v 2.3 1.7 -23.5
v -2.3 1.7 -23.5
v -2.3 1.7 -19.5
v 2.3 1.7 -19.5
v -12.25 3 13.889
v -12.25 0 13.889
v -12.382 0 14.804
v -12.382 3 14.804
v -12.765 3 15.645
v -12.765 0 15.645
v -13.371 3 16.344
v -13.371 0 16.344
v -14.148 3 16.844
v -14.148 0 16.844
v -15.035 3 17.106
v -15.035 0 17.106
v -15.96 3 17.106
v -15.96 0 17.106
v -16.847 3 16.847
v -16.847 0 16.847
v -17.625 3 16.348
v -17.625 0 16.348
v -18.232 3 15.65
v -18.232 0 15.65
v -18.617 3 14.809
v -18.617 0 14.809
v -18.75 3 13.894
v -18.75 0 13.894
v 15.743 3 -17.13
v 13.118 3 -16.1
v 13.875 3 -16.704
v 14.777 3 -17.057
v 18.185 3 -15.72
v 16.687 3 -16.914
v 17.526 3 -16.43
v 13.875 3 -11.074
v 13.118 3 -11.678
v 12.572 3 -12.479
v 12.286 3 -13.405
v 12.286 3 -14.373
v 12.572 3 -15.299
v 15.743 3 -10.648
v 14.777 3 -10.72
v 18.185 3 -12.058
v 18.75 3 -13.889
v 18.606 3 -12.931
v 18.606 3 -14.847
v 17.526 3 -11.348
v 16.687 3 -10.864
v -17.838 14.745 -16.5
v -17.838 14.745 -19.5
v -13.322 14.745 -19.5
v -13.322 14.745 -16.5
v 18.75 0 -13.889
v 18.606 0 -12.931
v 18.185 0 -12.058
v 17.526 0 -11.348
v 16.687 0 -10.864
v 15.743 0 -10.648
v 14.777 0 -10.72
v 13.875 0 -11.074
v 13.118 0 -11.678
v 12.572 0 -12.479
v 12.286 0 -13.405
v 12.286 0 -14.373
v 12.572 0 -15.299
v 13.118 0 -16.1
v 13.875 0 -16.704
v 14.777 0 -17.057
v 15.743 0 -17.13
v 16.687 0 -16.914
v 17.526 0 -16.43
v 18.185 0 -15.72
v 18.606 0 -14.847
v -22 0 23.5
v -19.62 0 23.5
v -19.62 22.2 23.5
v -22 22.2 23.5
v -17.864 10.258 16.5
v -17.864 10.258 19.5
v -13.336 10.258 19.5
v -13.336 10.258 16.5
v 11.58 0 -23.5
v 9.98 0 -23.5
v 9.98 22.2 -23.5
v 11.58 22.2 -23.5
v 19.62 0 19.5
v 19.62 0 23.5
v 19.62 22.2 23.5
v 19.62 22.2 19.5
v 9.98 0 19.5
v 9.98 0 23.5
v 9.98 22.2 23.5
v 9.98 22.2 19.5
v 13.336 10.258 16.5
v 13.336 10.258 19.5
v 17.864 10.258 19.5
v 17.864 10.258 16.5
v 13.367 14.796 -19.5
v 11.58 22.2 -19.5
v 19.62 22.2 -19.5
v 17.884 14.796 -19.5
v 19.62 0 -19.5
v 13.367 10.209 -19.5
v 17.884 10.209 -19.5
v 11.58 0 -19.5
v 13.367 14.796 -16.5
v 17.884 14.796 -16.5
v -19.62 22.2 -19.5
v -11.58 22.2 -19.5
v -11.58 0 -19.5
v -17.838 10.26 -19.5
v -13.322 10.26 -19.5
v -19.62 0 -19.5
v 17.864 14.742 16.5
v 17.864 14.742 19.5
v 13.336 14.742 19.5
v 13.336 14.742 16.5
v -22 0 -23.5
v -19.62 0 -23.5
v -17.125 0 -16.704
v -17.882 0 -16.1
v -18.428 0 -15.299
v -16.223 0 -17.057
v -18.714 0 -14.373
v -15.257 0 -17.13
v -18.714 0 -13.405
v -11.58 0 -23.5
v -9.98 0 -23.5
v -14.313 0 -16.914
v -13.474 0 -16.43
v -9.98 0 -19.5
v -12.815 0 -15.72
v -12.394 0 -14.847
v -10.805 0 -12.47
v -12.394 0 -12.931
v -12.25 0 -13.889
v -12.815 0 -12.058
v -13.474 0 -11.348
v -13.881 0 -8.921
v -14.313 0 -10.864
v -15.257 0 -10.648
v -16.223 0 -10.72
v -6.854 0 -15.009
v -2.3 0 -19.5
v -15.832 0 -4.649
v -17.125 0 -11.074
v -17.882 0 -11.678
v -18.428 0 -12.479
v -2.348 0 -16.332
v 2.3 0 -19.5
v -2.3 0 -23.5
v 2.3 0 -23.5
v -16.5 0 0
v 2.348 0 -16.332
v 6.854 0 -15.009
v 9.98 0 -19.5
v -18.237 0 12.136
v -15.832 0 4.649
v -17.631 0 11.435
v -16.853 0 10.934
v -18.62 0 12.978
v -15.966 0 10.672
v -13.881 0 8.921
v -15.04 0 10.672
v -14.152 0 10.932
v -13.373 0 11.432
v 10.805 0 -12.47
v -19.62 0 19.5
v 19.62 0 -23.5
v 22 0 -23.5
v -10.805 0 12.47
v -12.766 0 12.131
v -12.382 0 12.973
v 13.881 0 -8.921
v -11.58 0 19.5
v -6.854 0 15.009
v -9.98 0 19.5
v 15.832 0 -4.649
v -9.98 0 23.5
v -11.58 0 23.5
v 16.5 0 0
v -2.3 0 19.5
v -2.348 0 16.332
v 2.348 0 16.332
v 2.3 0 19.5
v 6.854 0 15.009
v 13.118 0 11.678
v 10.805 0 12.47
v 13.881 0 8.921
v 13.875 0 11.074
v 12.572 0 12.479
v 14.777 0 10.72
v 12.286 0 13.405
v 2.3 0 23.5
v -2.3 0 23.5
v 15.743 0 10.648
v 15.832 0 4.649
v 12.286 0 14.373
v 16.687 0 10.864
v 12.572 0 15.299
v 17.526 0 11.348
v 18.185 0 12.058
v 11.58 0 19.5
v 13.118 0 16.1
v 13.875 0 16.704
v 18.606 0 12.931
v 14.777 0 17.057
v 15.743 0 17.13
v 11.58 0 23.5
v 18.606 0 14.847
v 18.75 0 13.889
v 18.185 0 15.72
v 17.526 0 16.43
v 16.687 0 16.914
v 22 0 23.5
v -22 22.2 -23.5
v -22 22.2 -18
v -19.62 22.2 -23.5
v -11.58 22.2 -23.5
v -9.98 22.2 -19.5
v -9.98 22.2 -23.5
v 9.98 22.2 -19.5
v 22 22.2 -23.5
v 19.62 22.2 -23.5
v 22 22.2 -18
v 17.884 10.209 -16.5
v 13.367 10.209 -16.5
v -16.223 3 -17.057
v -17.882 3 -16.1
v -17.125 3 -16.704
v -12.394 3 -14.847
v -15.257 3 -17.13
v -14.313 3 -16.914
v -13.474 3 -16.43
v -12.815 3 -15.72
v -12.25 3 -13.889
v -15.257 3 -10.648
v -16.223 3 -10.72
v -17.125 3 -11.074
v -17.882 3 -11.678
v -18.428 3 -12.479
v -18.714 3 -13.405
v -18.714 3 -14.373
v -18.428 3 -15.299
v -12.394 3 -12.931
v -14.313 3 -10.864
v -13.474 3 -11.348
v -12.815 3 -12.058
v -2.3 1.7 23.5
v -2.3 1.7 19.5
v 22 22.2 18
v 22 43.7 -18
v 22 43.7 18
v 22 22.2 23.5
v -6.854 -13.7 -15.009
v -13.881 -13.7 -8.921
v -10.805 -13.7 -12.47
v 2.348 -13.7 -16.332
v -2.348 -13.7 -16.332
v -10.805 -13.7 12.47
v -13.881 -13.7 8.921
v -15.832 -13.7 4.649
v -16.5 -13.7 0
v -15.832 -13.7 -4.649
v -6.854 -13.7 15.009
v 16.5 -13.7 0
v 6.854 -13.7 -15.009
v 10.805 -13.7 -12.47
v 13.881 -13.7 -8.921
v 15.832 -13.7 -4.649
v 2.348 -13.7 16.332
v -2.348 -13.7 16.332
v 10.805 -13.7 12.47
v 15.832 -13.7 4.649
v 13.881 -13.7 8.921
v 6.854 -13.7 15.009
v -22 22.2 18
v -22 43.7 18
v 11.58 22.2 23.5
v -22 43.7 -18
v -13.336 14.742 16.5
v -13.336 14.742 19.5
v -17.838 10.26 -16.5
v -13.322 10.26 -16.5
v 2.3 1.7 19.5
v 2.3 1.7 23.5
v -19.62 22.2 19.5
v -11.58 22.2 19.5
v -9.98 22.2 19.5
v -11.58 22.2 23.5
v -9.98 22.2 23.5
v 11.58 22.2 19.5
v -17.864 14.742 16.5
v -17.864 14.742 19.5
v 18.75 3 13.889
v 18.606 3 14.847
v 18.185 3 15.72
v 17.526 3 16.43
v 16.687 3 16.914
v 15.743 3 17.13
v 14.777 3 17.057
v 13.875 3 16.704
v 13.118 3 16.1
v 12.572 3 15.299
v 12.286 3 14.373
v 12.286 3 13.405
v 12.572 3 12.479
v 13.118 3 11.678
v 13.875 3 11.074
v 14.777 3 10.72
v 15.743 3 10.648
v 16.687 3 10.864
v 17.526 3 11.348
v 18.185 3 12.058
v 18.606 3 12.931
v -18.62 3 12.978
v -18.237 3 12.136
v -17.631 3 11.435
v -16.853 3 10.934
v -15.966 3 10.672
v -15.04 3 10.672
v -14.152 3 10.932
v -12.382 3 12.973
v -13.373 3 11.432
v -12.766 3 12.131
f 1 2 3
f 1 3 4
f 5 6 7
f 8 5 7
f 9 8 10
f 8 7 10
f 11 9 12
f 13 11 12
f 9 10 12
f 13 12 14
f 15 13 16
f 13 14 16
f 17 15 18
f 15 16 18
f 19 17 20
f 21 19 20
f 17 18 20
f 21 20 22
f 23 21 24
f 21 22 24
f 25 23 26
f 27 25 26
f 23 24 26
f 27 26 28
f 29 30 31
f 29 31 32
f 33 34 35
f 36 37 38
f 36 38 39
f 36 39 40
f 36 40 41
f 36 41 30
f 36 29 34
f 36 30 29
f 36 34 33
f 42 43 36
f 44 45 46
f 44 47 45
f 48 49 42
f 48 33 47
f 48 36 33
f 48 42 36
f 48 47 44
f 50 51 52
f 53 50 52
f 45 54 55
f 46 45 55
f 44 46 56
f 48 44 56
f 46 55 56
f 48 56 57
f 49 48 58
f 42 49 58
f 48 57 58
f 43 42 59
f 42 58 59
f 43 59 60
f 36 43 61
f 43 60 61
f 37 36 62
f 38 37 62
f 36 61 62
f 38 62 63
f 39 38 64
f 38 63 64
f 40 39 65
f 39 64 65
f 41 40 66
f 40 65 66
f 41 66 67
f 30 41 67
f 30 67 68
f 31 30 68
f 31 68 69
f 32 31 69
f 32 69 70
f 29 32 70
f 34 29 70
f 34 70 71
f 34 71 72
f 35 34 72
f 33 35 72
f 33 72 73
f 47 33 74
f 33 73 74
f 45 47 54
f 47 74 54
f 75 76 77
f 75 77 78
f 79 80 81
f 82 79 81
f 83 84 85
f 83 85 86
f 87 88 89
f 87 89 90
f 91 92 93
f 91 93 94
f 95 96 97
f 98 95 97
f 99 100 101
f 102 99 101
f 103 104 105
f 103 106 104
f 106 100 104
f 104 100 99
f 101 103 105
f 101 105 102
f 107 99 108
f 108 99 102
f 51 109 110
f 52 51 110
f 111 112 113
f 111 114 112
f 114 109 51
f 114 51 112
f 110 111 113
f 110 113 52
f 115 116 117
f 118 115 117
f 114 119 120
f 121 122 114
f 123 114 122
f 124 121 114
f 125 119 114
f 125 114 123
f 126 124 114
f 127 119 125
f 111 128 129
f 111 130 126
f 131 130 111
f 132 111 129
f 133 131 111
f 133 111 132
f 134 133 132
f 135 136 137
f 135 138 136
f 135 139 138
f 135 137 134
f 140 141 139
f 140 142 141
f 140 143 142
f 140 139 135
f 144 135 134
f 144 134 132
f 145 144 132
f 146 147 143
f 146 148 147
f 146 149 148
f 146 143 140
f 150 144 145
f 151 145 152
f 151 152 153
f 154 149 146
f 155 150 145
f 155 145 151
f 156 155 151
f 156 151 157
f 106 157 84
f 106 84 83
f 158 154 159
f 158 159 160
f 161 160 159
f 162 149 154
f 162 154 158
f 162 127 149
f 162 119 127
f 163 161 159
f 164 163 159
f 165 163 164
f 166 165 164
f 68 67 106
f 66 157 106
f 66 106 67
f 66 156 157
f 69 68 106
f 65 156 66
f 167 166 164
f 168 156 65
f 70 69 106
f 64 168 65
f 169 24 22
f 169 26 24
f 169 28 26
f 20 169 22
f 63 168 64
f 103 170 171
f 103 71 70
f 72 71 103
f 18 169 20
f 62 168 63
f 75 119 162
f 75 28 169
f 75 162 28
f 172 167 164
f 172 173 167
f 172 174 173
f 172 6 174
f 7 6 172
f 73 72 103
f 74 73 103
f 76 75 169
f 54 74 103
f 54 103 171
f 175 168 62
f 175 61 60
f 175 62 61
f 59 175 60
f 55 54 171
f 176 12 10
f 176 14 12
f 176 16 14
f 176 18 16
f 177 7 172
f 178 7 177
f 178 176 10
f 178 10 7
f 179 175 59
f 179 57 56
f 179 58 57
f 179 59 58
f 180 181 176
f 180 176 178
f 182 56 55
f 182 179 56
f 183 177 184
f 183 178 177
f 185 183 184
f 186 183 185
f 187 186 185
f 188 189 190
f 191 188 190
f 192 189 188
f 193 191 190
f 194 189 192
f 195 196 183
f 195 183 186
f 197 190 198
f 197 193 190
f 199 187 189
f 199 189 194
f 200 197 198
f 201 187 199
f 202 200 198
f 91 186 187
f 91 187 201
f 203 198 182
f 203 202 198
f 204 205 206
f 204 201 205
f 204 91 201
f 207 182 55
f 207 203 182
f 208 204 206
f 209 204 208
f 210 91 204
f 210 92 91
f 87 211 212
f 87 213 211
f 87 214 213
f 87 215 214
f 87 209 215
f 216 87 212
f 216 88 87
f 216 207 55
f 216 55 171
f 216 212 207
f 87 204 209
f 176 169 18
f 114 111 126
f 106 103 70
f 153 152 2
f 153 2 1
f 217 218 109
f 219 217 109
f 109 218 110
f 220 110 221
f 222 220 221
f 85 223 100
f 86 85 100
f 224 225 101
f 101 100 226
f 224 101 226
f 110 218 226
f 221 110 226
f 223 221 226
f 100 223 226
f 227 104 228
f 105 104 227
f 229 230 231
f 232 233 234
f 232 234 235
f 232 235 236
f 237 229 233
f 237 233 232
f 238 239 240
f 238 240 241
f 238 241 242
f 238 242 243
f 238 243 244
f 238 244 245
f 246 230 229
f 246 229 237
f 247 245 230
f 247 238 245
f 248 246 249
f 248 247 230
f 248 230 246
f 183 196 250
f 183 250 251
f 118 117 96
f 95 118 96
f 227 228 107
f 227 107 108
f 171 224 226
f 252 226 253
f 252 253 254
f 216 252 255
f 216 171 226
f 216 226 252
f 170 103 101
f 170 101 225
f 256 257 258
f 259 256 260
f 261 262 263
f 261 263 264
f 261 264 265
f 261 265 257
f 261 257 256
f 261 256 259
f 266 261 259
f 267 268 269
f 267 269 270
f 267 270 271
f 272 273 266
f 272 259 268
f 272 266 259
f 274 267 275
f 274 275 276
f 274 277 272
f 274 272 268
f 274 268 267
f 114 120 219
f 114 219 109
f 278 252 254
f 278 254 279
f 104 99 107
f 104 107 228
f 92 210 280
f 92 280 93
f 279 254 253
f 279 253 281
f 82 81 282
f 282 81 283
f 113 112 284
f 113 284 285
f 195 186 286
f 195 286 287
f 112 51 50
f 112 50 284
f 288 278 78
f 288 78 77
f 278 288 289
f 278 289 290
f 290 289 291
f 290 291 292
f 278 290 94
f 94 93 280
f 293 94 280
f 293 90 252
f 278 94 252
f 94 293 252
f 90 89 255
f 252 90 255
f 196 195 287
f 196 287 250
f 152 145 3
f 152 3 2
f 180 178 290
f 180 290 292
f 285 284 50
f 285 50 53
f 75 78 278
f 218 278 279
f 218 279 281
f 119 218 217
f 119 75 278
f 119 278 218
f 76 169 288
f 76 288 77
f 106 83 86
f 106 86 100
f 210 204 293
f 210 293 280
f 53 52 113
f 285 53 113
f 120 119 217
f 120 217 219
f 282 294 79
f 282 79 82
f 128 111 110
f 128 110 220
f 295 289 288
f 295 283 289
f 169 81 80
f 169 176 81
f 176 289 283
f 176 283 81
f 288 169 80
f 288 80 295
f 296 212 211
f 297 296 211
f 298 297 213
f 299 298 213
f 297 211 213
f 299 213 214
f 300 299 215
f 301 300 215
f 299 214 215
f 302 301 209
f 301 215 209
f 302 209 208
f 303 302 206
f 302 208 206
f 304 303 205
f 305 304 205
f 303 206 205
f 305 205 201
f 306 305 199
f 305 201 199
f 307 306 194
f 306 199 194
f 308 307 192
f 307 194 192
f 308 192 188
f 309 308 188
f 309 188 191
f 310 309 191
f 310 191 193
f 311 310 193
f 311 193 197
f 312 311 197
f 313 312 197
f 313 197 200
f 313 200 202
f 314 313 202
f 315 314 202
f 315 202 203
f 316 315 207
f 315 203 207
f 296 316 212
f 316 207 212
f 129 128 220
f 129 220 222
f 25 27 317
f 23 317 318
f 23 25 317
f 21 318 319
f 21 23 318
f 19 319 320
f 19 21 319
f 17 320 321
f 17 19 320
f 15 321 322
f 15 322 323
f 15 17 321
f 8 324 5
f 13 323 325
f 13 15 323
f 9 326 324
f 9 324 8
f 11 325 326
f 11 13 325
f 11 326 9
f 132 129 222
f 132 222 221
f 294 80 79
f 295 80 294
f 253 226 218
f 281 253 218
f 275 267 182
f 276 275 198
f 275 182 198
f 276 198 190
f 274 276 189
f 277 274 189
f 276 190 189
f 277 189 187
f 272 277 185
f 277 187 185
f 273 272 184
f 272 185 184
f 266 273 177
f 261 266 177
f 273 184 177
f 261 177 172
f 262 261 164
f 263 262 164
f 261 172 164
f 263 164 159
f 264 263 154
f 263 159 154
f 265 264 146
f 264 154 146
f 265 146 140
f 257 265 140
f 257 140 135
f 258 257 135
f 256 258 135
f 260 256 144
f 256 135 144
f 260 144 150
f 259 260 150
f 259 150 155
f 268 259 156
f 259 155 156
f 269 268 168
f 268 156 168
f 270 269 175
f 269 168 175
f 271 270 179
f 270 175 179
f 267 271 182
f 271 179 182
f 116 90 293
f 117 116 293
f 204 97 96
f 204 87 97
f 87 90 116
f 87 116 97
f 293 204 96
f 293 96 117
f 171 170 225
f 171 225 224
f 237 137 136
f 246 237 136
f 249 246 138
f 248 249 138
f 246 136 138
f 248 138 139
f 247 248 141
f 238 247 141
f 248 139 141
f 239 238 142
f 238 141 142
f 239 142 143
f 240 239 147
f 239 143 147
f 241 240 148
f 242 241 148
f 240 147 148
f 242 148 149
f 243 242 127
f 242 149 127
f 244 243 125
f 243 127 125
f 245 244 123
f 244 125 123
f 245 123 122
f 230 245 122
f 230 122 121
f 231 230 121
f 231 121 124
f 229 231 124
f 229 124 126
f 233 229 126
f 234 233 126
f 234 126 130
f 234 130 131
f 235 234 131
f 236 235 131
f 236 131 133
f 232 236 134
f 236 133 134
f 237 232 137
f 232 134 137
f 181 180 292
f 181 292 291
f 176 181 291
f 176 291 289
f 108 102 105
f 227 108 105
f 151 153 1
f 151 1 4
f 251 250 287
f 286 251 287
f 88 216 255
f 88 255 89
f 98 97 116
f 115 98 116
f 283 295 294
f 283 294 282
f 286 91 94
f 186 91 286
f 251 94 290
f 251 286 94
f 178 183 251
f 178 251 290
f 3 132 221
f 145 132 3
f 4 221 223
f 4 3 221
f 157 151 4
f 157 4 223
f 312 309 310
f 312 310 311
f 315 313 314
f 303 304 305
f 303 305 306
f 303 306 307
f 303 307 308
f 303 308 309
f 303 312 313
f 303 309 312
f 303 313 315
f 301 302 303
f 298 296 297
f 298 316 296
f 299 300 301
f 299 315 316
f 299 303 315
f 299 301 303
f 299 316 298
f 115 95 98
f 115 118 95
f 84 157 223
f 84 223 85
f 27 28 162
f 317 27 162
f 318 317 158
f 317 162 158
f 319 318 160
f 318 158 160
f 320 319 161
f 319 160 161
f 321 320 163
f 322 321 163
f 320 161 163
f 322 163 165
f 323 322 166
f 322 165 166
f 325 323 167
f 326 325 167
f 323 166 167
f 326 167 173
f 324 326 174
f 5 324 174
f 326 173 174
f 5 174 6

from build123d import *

# Parameters (mm, degrees)
F0_R      = 3.25
F0_R_2    = 16.5
F1_DEPTH  = 22.2
F2_W      = 4.6
F2_H      = 20.5
F3_DEPTH  = 4
F4_W      = 4.6
F4_H      = 20.5
F5_DEPTH  = 4
F6_DEPTH  = 3
F7_DEPTH  = 13.7
F8_W      = 44
F8_H      = 36
F9_DEPTH  = 21.5
F10_W     = 4.527392
F10_H     = 4.484308
F12_DEPTH = 3
F11_W     = 4.516719
F11_H     = 4.586656
F11_W_2   = 4.516715
F11_H_2   = 4.484454
F13_DEPTH = 3


with BuildPart() as f1:
    # F0 (on Front) → F1 (new body)
    with BuildSketch(Plane.XZ):
        Polygon((19.62, -23.5), (22, -23.5), (22, -19.5), (22, 19.5), (22, 23.5), (19.62, 23.5), (19.62, 19.5), (11.58, 19.5), (11.58, 23.5), (9.98, 23.5), (9.98, 19.5), (2.3, 19.5), (2.3, 23.5), (-2.3, 23.5), (-2.3, 19.5), (-9.98, 19.5), (-9.98, 23.5), (-11.58, 23.5), (-11.58, 19.5), (-19.62, 19.5), (-19.62, 23.5), (-22, 23.5), (-22, 19.5), (-22, 13.9), (-22, -19.5), (-22, -23.5), (-19.62, -23.5), (-19.62, -19.5), (-11.58, -19.5), (-11.58, -23.5), (-9.98, -23.5), (-9.98, -19.5), (-2.3, -19.5), (-2.3, -23.5), (2.3, -23.5), (2.3, -19.5), (9.98, -19.5), (9.98, -23.5), (11.58, -23.5), (11.58, -19.5), (19.62, -19.5), align=None)
        with Locations((-15.500009, -13.888962)):
            Circle(F0_R, mode=Mode.SUBTRACT)
        with Locations((15.500009, -13.888962)):
            Circle(F0_R, mode=Mode.SUBTRACT)
        with BuildLine():
            ThreePointArc((-12.250009, 13.888962), (-15.502769, 10.638963), (-18.750005, 13.894481))
            ThreePointArc((-18.750005, 13.894481), (-15.49725, 17.13896), (-12.250009, 13.888962))
        make_face(mode=Mode.SUBTRACT)
        Circle(F0_R_2, mode=Mode.SUBTRACT)
        with Locations((15.500009, 13.888962)):
            Circle(F0_R, mode=Mode.SUBTRACT)
        with BuildLine():
            ThreePointArc((-12.250009, 13.888962), (-15.49725, 17.13896), (-18.750005, 13.894481))
            ThreePointArc((-18.750005, 13.894481), (-15.502769, 10.638963), (-12.250009, 13.888962))
        make_face()
        with Locations((15.500009, 13.888962)):
            Circle(F0_R)
        Circle(F0_R_2)
        with Locations((-15.500009, -13.888962)):
            Circle(F0_R)
        with Locations((15.500009, -13.888962)):
            Circle(F0_R)
    extrude(amount=-F1_DEPTH)

    # F2 (on face) → F3 (cut)
    with BuildSketch(Plane.XY.offset(23.5)):
        with Locations((0, 11.95)):
            Rectangle(F2_W, F2_H)
    extrude(amount=-F3_DEPTH, mode=Mode.SUBTRACT)

    # F4 (on face) → F5 (cut)
    with BuildSketch(Plane(origin=(0, 0, -23.5), x_dir=(1, 0, 0), z_dir=(0, 0, -1))):
        with Locations((0, -11.95)):
            Rectangle(F4_W, F4_H)
    extrude(amount=-F5_DEPTH, mode=Mode.SUBTRACT)

    # F0 (on Front) → F6 (cut)
    with BuildSketch(Plane.XZ):
        with BuildLine():
            ThreePointArc((-12.250009, 13.888962), (-15.49725, 17.13896), (-18.750005, 13.894481))
            ThreePointArc((-18.750005, 13.894481), (-15.502769, 10.638963), (-12.250009, 13.888962))
        make_face()
        with Locations((15.500009, 13.888962)):
            Circle(F0_R)
        with Locations((15.500009, -13.888962)):
            Circle(F0_R)
        with Locations((-15.500009, -13.888962)):
            Circle(F0_R)
    extrude(amount=-F6_DEPTH, mode=Mode.SUBTRACT)

    # F0 (on Front) → F7 (join)
    with BuildSketch(Plane.XZ):
        Circle(F0_R_2)
    extrude(amount=F7_DEPTH)

    # F8 (on face) → F9 (join)
    with BuildSketch(Plane(origin=(0, 22.2, 0), x_dir=(-1, 0, 0), z_dir=(0, 1, 0))):
        Rectangle(F8_W, F8_H)
    extrude(amount=F9_DEPTH)

    # F10 (on face) → F12 (cut)
    with BuildSketch(Plane.XY.offset(19.5)):
        with Locations((-15.6, 12.5)):
            Rectangle(F10_W, F10_H)
        Polygon((13.336304, 10.257846), (15.6, 10.257846), (17.863696, 10.257846), (17.863696, 14.742154), (13.336304, 14.742154), align=None)
    extrude(amount=-F12_DEPTH, mode=Mode.SUBTRACT)

    # F11 (on face) → F13 (cut)
    with BuildSketch(Plane(origin=(0, 0, -19.5), x_dir=(1, 0, 0), z_dir=(0, 0, -1))):
        with Locations((15.625707, -12.502325)):
            Rectangle(F11_W, F11_H)
        with Locations((-15.580125, -12.502325)):
            Rectangle(F11_W_2, F11_H_2)
    extrude(amount=-F13_DEPTH, mode=Mode.SUBTRACT)


solid = f1.part
